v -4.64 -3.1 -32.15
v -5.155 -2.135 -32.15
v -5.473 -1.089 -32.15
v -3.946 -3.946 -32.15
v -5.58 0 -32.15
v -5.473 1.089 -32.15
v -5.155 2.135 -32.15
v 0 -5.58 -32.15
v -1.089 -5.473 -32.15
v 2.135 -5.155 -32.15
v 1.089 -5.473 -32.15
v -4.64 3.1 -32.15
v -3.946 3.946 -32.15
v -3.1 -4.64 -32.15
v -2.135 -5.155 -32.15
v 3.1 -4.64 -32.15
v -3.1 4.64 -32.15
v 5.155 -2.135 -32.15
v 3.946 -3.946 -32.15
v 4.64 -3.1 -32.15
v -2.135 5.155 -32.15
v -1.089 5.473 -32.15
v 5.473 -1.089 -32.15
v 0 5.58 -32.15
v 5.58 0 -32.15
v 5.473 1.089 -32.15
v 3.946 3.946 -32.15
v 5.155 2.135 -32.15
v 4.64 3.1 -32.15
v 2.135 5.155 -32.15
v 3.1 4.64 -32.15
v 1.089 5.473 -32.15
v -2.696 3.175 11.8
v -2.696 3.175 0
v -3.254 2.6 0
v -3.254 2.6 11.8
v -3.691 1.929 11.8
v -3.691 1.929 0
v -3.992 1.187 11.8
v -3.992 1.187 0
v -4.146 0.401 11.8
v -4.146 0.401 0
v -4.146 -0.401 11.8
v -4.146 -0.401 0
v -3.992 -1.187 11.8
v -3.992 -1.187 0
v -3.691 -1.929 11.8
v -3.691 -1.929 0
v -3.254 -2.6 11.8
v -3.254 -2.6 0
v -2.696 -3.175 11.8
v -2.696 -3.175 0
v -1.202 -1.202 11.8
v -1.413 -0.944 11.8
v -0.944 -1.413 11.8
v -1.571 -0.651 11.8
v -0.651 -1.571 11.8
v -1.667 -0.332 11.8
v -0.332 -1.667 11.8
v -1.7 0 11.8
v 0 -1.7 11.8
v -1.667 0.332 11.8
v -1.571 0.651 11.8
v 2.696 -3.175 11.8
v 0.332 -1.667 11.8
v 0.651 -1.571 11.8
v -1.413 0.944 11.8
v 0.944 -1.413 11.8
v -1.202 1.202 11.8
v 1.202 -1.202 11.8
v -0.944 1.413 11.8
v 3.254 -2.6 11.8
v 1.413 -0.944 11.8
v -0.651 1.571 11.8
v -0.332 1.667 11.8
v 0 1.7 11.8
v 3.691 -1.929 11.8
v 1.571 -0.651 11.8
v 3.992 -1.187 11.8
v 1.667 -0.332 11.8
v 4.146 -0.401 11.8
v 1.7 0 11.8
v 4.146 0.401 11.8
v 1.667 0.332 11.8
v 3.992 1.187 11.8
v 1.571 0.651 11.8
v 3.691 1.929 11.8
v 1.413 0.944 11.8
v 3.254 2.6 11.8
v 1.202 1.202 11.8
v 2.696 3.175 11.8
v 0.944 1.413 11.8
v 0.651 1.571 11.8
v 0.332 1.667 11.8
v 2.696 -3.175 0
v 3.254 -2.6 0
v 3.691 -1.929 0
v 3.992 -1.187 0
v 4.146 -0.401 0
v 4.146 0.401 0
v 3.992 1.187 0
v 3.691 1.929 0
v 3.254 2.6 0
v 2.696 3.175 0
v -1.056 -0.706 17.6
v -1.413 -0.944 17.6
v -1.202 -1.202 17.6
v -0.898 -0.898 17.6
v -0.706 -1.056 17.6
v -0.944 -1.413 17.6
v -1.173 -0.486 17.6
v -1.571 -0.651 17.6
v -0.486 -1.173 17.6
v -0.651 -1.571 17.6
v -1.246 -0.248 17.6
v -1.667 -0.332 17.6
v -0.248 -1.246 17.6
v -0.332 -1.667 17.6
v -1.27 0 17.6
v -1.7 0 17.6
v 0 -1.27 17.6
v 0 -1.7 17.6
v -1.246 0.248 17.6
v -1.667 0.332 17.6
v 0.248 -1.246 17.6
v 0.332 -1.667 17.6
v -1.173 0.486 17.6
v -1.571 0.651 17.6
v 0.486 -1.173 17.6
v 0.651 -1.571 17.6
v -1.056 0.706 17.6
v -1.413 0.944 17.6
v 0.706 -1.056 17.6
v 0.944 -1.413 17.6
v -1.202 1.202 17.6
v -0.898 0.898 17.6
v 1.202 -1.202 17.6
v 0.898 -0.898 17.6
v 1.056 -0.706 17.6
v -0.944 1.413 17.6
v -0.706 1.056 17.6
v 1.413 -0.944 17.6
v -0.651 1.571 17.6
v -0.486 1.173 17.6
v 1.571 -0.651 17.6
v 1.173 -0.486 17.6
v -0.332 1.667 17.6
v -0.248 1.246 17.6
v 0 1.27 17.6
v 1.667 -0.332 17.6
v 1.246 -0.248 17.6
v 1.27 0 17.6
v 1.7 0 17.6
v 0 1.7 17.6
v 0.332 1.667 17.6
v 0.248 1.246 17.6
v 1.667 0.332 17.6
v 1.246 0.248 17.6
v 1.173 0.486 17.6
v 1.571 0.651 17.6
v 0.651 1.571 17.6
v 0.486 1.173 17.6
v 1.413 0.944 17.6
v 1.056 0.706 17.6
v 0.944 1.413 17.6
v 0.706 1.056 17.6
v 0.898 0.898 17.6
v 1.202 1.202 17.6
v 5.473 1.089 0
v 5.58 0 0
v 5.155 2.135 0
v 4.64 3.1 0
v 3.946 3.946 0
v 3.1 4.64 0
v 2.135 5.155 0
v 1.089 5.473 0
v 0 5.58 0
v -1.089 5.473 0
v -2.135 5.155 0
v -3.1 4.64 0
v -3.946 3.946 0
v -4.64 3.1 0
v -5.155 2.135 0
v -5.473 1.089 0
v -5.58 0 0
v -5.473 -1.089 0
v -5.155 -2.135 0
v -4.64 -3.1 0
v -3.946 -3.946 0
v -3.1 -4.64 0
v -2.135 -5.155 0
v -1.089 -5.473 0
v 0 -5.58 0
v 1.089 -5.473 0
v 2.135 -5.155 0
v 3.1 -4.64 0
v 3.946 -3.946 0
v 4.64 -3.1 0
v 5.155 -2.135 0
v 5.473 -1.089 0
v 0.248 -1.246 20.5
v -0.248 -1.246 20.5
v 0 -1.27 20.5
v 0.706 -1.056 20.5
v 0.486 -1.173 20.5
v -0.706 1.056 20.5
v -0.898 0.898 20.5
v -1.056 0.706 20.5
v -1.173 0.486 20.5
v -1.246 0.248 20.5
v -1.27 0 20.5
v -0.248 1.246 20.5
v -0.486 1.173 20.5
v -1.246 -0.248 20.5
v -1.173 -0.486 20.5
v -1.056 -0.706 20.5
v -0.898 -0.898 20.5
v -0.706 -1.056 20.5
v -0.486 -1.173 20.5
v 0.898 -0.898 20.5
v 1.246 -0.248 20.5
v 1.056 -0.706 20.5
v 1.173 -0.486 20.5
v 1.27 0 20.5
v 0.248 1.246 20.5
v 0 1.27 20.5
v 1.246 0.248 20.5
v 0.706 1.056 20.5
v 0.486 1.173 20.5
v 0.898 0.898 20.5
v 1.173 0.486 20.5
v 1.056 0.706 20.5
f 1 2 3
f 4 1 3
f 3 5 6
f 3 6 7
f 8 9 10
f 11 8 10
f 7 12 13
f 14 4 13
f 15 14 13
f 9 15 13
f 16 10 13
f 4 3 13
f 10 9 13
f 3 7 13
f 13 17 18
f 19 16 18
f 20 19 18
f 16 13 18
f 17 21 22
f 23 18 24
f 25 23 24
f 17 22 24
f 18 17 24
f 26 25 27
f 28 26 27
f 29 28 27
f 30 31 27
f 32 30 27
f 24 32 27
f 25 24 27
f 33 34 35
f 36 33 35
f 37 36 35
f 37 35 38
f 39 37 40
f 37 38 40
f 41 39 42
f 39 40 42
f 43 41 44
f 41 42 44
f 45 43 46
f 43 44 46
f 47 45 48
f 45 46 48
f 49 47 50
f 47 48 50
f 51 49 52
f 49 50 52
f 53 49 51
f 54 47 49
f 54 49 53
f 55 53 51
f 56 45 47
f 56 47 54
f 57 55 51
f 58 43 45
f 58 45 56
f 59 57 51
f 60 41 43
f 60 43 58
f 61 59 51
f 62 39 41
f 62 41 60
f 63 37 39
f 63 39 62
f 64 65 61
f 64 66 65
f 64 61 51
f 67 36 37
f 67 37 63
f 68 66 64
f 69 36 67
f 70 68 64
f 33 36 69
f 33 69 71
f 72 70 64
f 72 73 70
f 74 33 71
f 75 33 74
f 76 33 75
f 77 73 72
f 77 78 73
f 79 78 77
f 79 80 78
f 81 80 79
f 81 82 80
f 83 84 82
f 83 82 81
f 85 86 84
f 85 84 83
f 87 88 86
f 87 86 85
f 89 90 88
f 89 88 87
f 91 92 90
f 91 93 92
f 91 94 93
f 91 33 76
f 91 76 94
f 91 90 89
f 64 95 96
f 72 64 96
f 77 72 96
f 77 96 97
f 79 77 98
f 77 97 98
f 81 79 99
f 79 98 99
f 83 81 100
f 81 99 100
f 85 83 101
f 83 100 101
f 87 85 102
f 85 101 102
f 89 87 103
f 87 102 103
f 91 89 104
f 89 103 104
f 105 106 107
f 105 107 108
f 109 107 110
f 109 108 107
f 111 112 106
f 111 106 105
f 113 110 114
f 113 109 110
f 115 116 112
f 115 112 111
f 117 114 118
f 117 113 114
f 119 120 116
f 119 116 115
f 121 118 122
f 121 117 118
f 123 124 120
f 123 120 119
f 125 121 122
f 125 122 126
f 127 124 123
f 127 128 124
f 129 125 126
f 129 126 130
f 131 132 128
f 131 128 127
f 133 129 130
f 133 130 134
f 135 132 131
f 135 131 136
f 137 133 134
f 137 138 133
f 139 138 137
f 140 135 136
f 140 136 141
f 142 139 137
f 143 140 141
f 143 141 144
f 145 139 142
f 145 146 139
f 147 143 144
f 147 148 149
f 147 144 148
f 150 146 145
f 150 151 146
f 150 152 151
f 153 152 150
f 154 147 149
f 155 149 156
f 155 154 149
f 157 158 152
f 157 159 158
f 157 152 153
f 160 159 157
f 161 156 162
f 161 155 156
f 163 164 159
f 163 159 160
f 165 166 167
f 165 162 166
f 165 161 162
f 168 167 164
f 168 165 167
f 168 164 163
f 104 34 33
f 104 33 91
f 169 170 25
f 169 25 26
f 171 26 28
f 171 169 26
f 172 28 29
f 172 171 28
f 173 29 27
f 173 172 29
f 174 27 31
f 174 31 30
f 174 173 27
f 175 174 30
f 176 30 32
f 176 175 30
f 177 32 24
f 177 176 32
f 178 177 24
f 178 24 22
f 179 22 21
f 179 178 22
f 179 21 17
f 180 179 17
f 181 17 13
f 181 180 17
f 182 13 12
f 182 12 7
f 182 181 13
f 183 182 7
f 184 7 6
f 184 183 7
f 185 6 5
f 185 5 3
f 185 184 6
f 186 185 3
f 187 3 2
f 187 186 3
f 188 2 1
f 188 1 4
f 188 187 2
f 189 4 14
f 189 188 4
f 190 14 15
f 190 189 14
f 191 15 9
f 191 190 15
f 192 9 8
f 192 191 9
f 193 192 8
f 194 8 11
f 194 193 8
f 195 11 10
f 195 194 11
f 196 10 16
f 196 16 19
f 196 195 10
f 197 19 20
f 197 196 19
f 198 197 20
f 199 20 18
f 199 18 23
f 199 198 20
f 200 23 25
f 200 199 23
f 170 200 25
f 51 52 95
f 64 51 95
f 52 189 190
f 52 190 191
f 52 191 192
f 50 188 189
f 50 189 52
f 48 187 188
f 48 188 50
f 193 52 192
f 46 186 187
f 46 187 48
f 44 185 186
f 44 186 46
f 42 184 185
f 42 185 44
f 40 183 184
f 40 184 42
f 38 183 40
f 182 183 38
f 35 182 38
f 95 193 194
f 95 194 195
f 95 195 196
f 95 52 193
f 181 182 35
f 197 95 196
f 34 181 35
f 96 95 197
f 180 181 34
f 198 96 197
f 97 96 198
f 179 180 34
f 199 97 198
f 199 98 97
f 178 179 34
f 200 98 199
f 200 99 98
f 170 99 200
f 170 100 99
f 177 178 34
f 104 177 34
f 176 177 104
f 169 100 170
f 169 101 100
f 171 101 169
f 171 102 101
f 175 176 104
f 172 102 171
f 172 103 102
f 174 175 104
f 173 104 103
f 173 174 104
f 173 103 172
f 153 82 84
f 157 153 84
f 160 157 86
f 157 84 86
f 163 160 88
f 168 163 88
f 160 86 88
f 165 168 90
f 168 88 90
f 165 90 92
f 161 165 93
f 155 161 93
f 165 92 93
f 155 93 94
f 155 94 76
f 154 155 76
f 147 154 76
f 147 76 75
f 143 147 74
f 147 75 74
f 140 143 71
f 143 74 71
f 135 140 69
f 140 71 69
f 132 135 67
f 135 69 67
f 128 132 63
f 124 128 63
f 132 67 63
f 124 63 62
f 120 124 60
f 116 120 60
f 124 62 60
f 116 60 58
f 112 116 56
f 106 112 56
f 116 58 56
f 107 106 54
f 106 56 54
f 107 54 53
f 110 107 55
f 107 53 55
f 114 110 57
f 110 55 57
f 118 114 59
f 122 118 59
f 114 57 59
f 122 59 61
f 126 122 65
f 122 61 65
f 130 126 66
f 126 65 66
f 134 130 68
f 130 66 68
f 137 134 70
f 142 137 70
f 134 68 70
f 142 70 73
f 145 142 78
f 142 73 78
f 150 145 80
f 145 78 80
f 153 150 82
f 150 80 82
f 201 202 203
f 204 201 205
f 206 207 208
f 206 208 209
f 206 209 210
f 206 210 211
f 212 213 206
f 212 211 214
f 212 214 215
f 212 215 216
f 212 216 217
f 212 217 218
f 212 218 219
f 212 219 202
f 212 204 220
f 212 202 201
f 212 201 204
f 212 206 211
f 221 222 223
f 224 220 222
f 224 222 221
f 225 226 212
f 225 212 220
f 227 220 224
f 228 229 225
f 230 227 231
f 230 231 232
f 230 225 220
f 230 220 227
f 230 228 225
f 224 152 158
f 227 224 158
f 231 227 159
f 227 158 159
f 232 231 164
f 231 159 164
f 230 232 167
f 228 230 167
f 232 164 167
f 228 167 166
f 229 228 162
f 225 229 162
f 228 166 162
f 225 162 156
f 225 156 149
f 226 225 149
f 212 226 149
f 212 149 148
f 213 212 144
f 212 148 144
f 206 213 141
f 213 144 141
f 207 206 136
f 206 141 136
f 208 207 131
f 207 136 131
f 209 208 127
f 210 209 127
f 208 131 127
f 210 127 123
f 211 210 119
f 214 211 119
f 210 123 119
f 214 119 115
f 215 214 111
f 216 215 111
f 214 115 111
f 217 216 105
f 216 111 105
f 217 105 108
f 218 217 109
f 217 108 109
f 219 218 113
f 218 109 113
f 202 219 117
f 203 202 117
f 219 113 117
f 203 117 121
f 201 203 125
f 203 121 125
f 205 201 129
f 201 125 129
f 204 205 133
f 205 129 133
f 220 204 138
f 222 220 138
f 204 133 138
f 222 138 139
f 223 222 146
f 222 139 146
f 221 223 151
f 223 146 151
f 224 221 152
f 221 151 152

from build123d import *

# Parameters (mm, degrees)
SKETCH002_R  = 1.7
PAD002_DEPTH = 5.8
SKETCH003_R  = 1.27
PAD003_DEPTH = 2.9
PAD_DEPTH    = 11.8
SKETCH001_R  = 5.58
PAD001_DEPTH = 32.15


with BuildPart() as metal:
    # Sketch002 → Pad002 (new body)
    with BuildSketch(Plane.XY):
        Circle(SKETCH002_R)
    extrude(amount=PAD002_DEPTH)

    # Sketch003 (on Face3 of Pad002) → Pad003 (join)
    with BuildSketch(Plane.XY.offset(5.8)):
        Circle(SKETCH003_R)
    extrude(amount=PAD003_DEPTH)


with BuildPart() as metal_1:
    # Body001 placement: moved
    add(metal.part.moved(Location((0, 0, 11.8))))


with BuildPart() as f_9280blk:
    # Sketch → Pad (new body)
    with BuildSketch(Plane.XY):
        with BuildLine():
            ThreePointArc((-2.695663, 3.175), (-4.165, 0), (-2.695663, -3.175))
            Line((-2.695663, -3.175), (2.695663, -3.175))
            ThreePointArc((2.695663, -3.175), (4.165, 0), (2.695663, 3.175))
            Line((-2.695663, 3.175), (2.695663, 3.175))
        make_face()
    extrude(amount=PAD_DEPTH)

    # Sketch001 (on Sketch) → Pad001 (join)
    with BuildSketch(Plane.XY):
        Circle(SKETCH001_R)
    extrude(amount=-PAD001_DEPTH)

    # Fusion: union metal
    add(metal_1.part)


solid = f_9280blk.part
